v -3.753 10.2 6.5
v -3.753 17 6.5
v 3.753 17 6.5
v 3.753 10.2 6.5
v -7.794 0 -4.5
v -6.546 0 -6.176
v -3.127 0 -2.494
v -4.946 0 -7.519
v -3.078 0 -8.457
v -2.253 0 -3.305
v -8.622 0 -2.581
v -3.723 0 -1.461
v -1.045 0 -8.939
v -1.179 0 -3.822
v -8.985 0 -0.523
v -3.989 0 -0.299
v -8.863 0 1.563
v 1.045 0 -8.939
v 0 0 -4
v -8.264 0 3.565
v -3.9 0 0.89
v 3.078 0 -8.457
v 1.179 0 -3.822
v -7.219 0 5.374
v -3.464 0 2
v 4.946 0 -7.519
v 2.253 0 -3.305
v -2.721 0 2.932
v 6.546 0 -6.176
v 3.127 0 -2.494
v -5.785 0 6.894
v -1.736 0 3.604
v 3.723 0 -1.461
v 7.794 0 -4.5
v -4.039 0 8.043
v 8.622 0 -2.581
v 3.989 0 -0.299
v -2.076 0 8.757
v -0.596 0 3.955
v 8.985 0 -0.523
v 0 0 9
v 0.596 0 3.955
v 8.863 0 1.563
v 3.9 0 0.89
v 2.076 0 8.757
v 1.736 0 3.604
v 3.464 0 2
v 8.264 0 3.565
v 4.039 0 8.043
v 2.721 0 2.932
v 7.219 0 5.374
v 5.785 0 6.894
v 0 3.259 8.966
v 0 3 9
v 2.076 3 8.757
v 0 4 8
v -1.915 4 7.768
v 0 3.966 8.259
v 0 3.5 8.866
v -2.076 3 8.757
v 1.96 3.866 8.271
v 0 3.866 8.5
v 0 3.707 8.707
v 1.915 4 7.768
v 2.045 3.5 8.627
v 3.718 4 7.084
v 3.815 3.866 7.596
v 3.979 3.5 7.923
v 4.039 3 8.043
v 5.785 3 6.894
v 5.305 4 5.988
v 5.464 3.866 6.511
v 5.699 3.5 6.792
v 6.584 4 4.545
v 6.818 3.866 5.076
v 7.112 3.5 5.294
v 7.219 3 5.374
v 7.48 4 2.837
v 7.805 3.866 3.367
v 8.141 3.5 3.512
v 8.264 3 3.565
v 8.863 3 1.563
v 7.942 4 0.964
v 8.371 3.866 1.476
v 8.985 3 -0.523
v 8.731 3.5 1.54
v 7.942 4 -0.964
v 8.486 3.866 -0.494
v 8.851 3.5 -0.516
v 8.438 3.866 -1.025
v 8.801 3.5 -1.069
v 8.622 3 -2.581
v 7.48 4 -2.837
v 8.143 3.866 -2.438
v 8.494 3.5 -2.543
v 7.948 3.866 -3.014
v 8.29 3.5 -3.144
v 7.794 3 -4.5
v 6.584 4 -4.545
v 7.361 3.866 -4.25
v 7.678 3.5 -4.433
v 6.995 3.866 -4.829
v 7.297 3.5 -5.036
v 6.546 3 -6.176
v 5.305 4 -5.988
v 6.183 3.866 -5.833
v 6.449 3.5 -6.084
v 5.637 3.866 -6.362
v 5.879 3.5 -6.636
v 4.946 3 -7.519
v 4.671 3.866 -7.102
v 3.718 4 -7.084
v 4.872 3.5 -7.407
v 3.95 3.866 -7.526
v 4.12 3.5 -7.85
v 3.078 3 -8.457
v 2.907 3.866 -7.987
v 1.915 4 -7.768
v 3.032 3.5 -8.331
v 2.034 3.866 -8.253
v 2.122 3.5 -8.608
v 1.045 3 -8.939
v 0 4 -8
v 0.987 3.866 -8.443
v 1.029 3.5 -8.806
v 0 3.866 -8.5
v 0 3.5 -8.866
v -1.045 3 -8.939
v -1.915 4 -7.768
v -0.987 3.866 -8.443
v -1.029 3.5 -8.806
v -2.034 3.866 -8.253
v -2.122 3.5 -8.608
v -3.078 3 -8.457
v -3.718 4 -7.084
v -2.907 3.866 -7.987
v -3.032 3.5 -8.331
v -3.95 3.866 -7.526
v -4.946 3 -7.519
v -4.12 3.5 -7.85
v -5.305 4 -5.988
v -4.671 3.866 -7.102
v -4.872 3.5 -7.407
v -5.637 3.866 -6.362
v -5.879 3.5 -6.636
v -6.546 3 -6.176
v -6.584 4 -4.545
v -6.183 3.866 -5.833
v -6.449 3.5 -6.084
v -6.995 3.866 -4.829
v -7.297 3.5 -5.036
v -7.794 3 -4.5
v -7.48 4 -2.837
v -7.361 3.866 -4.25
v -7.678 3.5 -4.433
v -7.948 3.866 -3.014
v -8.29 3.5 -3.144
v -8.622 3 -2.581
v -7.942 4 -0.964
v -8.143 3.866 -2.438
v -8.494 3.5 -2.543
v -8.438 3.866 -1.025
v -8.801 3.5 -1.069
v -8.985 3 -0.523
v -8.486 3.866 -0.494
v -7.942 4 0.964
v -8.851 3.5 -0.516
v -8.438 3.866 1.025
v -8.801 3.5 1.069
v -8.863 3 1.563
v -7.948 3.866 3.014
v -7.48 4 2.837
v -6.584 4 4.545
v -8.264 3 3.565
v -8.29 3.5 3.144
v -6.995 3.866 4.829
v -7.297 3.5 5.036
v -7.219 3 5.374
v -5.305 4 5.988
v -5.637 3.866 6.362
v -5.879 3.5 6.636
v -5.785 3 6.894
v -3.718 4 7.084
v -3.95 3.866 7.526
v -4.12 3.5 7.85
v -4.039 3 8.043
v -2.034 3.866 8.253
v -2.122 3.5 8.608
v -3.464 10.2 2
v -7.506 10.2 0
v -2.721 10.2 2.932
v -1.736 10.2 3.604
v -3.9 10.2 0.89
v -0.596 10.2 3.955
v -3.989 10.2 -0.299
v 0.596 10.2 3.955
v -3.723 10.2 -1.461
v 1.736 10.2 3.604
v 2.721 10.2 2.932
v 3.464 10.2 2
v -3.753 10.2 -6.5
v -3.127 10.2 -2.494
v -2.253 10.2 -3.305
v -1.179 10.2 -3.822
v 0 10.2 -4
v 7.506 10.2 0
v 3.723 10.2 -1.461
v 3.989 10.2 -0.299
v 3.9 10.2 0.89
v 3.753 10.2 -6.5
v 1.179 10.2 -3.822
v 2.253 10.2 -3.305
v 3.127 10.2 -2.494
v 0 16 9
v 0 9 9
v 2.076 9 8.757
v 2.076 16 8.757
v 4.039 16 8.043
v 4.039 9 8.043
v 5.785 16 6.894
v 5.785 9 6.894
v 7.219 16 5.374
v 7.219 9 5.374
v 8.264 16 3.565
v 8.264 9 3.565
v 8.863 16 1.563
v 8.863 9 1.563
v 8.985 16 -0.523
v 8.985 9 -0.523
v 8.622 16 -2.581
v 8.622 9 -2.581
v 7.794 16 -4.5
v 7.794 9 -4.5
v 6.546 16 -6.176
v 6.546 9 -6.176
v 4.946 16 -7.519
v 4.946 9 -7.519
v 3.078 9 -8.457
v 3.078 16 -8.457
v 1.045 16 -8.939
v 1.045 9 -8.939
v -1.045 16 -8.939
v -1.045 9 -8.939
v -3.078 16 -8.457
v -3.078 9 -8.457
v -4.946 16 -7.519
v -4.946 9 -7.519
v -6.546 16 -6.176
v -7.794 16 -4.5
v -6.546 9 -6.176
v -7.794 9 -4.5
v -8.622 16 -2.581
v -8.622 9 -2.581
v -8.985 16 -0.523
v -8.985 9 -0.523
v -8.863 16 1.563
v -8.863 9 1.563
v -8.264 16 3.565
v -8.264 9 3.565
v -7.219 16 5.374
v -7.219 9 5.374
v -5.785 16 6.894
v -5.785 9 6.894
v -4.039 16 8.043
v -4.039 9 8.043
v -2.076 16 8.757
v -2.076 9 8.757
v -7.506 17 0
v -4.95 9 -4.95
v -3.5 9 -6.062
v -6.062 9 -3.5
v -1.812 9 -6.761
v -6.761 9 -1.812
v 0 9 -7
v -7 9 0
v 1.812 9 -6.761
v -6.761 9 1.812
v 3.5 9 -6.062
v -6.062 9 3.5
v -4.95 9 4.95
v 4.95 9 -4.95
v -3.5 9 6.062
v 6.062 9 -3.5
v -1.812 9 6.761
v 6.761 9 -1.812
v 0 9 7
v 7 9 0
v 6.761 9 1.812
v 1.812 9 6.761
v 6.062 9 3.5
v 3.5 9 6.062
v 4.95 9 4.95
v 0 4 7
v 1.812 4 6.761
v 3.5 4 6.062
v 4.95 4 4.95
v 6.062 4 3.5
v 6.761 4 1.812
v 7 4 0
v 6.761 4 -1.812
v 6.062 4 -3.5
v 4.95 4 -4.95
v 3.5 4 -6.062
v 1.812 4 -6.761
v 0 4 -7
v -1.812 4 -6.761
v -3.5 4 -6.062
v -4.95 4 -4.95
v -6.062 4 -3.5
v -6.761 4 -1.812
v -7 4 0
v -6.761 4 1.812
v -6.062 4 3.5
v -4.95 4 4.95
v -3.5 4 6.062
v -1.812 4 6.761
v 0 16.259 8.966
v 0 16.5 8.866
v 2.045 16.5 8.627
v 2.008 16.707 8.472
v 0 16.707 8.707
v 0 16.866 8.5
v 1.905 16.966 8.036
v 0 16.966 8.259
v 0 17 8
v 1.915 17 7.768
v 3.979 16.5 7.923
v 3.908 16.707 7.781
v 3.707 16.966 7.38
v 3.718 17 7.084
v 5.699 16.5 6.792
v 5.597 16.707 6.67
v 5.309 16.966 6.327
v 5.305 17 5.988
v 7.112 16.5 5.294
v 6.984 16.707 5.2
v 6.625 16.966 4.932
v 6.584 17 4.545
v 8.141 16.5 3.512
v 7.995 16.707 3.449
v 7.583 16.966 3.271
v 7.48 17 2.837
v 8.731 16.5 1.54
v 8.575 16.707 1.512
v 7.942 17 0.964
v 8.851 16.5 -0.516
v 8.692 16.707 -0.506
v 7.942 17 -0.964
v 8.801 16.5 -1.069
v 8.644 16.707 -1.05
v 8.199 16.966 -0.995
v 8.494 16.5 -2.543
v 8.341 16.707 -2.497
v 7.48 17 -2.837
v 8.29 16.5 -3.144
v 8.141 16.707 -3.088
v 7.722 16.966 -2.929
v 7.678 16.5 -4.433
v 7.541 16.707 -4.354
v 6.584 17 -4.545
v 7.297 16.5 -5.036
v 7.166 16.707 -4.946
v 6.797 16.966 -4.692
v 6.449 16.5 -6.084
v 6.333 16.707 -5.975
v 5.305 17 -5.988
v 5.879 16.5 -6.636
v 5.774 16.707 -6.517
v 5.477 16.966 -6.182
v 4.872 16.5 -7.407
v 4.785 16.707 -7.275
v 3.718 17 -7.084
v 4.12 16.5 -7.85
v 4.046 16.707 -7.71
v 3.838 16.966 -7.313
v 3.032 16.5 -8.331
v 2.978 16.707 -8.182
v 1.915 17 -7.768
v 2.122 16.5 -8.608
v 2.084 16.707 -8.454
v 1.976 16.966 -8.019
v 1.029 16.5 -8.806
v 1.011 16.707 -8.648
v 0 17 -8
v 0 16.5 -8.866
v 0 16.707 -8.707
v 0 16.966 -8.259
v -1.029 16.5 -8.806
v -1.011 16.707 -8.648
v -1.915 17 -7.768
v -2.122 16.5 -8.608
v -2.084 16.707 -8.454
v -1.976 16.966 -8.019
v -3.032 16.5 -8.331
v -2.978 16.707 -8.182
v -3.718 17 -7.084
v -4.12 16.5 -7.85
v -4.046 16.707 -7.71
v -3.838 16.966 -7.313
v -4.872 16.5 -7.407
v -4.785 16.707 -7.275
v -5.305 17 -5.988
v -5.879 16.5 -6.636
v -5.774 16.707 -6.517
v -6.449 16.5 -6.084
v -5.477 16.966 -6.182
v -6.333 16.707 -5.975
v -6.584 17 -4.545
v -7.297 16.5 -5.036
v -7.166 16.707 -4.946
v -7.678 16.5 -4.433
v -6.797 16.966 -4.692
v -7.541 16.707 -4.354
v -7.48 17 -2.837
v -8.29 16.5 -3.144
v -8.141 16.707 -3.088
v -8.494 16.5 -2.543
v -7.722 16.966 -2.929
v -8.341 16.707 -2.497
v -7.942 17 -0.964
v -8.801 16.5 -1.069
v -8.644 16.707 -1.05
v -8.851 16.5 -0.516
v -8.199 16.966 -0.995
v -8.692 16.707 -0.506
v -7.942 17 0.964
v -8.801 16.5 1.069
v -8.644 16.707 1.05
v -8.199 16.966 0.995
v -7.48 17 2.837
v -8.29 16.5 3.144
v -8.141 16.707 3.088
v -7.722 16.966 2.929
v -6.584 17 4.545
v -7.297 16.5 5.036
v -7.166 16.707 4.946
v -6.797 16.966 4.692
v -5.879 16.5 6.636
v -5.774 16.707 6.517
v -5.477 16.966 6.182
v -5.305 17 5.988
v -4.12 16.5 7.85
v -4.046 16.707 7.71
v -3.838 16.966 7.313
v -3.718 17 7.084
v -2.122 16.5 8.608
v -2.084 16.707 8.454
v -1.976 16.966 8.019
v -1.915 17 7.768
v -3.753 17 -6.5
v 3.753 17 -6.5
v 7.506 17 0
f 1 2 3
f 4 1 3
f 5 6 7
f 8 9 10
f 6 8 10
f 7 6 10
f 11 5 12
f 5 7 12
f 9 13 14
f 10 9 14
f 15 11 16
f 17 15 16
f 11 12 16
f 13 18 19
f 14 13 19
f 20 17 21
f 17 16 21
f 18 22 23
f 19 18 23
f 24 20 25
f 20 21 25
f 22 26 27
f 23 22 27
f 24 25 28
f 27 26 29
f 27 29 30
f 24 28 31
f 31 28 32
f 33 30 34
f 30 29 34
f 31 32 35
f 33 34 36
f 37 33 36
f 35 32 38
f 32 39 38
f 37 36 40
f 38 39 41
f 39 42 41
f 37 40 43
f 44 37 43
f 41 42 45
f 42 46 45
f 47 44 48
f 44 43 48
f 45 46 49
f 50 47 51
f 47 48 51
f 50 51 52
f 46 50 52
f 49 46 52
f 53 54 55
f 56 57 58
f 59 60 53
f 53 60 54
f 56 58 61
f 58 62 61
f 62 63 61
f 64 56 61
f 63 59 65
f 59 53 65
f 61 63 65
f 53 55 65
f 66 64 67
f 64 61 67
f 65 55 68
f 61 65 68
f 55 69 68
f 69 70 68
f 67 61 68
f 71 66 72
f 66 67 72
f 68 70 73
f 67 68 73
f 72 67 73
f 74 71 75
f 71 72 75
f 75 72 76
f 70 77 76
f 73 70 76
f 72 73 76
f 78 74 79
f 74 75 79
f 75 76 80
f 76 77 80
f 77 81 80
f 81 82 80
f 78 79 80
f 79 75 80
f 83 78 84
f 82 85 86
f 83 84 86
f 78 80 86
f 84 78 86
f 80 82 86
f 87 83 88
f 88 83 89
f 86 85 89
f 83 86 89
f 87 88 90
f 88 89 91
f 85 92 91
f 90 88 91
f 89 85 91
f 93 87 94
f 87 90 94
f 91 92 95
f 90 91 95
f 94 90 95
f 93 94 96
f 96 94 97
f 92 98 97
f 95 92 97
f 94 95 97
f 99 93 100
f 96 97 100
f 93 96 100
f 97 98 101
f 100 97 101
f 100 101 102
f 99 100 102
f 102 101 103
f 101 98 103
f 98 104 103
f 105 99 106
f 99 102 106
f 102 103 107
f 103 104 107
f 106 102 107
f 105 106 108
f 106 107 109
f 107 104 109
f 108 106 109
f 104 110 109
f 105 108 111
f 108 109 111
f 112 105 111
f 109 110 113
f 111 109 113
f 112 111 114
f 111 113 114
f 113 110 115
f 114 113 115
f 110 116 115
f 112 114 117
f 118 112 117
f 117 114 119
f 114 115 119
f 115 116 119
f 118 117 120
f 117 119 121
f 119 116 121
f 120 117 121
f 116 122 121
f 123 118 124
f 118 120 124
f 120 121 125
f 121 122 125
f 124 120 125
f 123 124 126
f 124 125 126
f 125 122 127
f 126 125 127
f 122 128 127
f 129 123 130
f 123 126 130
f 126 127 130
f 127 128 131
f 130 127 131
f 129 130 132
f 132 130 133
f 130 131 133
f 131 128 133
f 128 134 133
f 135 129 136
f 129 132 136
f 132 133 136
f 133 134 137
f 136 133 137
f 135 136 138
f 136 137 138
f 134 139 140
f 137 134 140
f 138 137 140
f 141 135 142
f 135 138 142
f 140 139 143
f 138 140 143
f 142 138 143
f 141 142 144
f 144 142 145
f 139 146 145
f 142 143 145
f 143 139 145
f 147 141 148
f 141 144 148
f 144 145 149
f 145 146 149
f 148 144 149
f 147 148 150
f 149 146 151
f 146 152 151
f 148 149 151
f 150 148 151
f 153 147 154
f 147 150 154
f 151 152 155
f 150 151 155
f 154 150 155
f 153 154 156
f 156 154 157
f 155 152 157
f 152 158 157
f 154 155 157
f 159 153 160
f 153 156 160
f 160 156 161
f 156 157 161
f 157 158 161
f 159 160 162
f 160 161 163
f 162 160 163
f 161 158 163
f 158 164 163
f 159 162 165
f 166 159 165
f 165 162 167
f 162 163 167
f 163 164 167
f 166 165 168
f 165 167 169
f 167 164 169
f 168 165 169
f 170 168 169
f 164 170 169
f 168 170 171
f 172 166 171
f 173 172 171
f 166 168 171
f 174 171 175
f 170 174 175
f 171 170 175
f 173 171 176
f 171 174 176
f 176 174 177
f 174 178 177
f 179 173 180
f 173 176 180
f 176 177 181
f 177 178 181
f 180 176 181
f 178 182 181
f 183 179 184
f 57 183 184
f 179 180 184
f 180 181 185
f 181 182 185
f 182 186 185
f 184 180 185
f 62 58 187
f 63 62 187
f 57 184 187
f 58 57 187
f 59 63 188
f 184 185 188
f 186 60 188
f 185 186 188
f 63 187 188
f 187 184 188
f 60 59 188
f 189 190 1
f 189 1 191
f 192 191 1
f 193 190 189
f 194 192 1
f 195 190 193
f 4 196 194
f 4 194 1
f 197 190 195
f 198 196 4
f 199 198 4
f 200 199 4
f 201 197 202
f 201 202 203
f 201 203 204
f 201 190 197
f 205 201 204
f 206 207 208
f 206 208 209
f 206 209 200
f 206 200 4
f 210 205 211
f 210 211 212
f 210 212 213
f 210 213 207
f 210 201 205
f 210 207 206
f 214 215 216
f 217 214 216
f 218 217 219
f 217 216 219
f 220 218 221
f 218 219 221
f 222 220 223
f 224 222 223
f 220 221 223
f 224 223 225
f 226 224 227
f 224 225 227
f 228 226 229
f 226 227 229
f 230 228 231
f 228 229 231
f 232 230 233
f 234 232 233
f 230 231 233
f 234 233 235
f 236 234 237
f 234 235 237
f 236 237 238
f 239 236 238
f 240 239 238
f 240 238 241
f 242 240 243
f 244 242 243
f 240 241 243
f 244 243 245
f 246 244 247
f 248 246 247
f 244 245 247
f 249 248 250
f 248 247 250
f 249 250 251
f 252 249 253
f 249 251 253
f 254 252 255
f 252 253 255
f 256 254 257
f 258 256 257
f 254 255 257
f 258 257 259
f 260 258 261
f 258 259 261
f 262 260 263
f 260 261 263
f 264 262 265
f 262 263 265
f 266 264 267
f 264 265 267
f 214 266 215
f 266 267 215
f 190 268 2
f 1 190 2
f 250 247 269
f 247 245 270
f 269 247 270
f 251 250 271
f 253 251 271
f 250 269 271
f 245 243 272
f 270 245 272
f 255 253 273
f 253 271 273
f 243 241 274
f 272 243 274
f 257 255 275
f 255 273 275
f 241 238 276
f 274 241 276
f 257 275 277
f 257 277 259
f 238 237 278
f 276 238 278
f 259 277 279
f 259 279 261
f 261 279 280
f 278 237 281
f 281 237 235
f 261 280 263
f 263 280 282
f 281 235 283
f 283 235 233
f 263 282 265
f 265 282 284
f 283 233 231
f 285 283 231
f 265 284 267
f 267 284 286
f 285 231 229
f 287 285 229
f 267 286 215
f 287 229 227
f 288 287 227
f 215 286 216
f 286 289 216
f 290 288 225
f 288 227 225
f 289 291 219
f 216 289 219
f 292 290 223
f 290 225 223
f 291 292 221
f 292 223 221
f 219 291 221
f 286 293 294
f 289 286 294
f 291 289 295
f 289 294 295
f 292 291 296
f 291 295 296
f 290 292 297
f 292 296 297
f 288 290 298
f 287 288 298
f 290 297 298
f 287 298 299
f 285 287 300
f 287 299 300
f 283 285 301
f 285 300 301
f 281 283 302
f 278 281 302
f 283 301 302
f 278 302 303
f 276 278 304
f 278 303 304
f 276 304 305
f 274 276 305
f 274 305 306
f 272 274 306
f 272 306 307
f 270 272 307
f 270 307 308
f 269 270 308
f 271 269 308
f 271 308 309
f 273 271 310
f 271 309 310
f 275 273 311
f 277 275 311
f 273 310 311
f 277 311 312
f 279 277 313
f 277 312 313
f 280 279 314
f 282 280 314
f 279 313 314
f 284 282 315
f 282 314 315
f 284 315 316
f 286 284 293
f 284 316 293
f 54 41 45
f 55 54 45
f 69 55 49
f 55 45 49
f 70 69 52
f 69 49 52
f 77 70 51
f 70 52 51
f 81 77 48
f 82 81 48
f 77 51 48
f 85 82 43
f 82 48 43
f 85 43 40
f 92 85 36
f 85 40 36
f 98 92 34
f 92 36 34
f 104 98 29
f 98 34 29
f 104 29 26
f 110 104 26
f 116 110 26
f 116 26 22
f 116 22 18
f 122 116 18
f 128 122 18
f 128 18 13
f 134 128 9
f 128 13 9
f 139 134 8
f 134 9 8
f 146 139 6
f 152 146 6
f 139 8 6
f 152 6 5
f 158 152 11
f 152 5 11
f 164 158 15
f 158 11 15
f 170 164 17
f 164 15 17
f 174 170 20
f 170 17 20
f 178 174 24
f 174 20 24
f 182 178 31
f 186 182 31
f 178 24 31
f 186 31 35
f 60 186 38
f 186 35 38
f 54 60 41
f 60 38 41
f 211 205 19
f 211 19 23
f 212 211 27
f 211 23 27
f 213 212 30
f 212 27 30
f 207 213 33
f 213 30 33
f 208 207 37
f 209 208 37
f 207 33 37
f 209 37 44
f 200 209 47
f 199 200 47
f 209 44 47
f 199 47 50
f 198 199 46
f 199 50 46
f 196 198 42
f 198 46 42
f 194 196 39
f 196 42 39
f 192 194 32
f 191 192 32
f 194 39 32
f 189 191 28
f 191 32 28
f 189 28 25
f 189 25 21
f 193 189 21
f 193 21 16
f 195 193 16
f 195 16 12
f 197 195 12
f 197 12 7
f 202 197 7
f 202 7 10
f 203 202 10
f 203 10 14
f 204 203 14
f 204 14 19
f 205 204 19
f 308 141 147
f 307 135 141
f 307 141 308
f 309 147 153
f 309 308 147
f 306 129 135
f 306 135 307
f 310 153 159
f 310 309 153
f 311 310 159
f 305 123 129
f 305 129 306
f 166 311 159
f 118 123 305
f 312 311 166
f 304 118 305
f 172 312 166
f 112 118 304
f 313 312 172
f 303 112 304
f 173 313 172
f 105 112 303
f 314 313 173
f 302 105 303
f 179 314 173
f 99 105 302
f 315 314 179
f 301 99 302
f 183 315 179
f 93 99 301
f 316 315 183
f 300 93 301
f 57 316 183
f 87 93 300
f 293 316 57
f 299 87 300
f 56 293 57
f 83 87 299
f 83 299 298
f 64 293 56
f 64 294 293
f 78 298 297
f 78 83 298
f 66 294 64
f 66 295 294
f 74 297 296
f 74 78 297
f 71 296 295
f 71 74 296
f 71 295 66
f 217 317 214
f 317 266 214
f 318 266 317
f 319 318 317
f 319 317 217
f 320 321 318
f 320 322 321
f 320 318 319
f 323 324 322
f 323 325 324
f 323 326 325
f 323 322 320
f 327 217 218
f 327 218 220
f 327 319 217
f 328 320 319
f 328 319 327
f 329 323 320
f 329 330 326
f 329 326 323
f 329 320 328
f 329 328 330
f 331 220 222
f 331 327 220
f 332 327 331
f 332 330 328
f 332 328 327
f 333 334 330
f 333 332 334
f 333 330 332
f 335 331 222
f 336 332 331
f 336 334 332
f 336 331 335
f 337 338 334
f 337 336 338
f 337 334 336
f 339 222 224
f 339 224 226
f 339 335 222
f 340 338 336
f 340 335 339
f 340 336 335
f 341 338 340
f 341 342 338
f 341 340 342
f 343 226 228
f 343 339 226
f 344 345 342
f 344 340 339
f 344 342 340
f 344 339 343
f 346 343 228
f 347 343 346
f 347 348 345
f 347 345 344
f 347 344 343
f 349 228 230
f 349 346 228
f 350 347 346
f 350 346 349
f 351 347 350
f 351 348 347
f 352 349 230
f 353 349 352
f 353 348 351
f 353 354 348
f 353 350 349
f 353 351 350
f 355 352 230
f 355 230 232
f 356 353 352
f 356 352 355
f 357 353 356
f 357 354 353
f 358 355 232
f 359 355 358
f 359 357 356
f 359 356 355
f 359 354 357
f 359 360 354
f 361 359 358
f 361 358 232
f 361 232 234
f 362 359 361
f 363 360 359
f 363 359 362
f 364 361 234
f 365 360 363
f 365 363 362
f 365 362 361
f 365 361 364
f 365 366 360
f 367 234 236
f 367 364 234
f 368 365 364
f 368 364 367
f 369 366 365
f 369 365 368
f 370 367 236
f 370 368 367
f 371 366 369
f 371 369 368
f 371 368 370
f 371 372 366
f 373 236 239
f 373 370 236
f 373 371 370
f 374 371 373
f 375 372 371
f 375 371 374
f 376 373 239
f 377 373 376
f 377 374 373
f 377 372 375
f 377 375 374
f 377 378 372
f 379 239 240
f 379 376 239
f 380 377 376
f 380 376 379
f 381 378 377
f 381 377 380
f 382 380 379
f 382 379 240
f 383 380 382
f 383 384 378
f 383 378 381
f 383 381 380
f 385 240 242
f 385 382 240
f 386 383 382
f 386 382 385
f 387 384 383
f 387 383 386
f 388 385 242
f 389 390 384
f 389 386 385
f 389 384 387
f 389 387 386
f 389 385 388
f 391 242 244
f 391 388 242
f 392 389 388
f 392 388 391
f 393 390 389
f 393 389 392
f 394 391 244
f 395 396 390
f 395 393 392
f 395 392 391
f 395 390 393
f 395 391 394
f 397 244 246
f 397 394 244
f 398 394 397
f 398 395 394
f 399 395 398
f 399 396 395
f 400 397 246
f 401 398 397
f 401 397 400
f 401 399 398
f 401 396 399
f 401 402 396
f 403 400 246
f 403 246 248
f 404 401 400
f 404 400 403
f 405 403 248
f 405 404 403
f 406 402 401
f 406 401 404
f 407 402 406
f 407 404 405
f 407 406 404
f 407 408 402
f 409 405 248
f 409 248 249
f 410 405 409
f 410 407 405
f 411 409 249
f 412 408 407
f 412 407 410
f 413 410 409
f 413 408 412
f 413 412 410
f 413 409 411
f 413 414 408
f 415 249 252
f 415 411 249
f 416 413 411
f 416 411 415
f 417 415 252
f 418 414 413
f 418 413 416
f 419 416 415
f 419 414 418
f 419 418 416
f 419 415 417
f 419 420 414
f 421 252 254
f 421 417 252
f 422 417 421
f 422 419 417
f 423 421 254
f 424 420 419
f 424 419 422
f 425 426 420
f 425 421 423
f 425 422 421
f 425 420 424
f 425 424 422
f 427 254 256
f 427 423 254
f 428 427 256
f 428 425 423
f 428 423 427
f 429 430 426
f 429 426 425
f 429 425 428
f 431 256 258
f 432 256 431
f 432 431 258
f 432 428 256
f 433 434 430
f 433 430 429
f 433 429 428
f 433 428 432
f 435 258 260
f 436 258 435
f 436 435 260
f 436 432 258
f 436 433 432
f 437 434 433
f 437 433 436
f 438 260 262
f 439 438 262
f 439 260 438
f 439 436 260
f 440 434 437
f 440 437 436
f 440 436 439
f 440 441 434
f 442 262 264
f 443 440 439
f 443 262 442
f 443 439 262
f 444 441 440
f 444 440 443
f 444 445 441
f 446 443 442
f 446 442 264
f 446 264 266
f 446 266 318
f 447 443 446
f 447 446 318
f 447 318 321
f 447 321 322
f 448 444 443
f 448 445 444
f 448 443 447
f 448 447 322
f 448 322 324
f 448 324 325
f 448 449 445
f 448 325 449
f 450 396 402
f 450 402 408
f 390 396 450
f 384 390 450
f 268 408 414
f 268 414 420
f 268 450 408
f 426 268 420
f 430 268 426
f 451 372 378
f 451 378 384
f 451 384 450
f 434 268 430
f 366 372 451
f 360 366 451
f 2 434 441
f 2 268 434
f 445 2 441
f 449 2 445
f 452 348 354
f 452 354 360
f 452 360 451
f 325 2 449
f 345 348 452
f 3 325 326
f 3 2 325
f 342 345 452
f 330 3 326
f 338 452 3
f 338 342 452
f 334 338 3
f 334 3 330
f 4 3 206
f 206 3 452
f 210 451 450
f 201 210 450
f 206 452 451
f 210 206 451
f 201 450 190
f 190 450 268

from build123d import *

# Parameters (mm, degrees)
SKETCH1_R           = 9
BOSS_EXTRUDE1_DEPTH = 4
SKETCH2_R           = 7
BOSS_EXTRUDE2_DEPTH = 5
SKETCH4_R           = 9
BOSS_EXTRUDE3_DEPTH = 8
FILLET1_R           = 1
FILLET2_R           = 1
SKETCH5_R           = 4
CUT_EXTRUDE1_DEPTH  = 18
CUT_EXTRUDE2_DEPTH  = 6.8


with BuildPart() as part:
    # Sketch1 → Boss-Extrude1 (new body)
    with BuildSketch(Plane(origin=(0, 0, 0), x_dir=(1, 0, 0), z_dir=(0, 1, 0))):
        with Locations(Location((0, 0, 0), (0, 0, 270))):
            Circle(SKETCH1_R)
    extrude(amount=BOSS_EXTRUDE1_DEPTH)

    # Sketch2 → Boss-Extrude2 (add)
    with BuildSketch(Plane(origin=(0, 4, 0), x_dir=(1, 0, 0), z_dir=(0, 1, 0))):
        with Locations(Location((0, 0, 0), (0, 0, 270))):
            Circle(SKETCH2_R)
    extrude(amount=BOSS_EXTRUDE2_DEPTH)

    # Sketch4 → Boss-Extrude3 (add)
    with BuildSketch(Plane(origin=(0, 9, 0), x_dir=(1, 0, 0), z_dir=(0, 1, 0))):
        with Locations(Location((0, 0, 0), (0, 0, 270))):
            Circle(SKETCH4_R)
    extrude(amount=BOSS_EXTRUDE3_DEPTH)

    # Fillet1
    fillet1_edges = [part.edges().sort_by_distance(p)[0] for p in [
        (0, 17, -9),
    ]]
    fillet(fillet1_edges, radius=FILLET1_R)

    # Fillet2
    fillet2_edges = [part.edges().sort_by_distance(p)[0] for p in [
        (0, 4, -9),
    ]]
    fillet(fillet2_edges, radius=FILLET2_R)

    # Sketch5 → Cut-Extrude1 (cut)
    with BuildSketch(Plane.XZ):
        with Locations(Location((0, 0, 0), (0, 0, 270))):
            Circle(SKETCH5_R)
    extrude(amount=-CUT_EXTRUDE1_DEPTH, mode=Mode.SUBTRACT)

    # Sketch6 → Cut-Extrude2 (cut)
    with BuildSketch(Plane(origin=(0, 17, 0), x_dir=(1, 0, 0), z_dir=(0, 1, 0))):
        Polygon((-7.505553499, 0), (-3.75277675, -6.5), (3.75277675, -6.5), (7.505553499, 0), (3.75277675, 6.5), (-3.75277675, 6.5), align=None)
    extrude(amount=-CUT_EXTRUDE2_DEPTH, mode=Mode.SUBTRACT)


solid = part.part
